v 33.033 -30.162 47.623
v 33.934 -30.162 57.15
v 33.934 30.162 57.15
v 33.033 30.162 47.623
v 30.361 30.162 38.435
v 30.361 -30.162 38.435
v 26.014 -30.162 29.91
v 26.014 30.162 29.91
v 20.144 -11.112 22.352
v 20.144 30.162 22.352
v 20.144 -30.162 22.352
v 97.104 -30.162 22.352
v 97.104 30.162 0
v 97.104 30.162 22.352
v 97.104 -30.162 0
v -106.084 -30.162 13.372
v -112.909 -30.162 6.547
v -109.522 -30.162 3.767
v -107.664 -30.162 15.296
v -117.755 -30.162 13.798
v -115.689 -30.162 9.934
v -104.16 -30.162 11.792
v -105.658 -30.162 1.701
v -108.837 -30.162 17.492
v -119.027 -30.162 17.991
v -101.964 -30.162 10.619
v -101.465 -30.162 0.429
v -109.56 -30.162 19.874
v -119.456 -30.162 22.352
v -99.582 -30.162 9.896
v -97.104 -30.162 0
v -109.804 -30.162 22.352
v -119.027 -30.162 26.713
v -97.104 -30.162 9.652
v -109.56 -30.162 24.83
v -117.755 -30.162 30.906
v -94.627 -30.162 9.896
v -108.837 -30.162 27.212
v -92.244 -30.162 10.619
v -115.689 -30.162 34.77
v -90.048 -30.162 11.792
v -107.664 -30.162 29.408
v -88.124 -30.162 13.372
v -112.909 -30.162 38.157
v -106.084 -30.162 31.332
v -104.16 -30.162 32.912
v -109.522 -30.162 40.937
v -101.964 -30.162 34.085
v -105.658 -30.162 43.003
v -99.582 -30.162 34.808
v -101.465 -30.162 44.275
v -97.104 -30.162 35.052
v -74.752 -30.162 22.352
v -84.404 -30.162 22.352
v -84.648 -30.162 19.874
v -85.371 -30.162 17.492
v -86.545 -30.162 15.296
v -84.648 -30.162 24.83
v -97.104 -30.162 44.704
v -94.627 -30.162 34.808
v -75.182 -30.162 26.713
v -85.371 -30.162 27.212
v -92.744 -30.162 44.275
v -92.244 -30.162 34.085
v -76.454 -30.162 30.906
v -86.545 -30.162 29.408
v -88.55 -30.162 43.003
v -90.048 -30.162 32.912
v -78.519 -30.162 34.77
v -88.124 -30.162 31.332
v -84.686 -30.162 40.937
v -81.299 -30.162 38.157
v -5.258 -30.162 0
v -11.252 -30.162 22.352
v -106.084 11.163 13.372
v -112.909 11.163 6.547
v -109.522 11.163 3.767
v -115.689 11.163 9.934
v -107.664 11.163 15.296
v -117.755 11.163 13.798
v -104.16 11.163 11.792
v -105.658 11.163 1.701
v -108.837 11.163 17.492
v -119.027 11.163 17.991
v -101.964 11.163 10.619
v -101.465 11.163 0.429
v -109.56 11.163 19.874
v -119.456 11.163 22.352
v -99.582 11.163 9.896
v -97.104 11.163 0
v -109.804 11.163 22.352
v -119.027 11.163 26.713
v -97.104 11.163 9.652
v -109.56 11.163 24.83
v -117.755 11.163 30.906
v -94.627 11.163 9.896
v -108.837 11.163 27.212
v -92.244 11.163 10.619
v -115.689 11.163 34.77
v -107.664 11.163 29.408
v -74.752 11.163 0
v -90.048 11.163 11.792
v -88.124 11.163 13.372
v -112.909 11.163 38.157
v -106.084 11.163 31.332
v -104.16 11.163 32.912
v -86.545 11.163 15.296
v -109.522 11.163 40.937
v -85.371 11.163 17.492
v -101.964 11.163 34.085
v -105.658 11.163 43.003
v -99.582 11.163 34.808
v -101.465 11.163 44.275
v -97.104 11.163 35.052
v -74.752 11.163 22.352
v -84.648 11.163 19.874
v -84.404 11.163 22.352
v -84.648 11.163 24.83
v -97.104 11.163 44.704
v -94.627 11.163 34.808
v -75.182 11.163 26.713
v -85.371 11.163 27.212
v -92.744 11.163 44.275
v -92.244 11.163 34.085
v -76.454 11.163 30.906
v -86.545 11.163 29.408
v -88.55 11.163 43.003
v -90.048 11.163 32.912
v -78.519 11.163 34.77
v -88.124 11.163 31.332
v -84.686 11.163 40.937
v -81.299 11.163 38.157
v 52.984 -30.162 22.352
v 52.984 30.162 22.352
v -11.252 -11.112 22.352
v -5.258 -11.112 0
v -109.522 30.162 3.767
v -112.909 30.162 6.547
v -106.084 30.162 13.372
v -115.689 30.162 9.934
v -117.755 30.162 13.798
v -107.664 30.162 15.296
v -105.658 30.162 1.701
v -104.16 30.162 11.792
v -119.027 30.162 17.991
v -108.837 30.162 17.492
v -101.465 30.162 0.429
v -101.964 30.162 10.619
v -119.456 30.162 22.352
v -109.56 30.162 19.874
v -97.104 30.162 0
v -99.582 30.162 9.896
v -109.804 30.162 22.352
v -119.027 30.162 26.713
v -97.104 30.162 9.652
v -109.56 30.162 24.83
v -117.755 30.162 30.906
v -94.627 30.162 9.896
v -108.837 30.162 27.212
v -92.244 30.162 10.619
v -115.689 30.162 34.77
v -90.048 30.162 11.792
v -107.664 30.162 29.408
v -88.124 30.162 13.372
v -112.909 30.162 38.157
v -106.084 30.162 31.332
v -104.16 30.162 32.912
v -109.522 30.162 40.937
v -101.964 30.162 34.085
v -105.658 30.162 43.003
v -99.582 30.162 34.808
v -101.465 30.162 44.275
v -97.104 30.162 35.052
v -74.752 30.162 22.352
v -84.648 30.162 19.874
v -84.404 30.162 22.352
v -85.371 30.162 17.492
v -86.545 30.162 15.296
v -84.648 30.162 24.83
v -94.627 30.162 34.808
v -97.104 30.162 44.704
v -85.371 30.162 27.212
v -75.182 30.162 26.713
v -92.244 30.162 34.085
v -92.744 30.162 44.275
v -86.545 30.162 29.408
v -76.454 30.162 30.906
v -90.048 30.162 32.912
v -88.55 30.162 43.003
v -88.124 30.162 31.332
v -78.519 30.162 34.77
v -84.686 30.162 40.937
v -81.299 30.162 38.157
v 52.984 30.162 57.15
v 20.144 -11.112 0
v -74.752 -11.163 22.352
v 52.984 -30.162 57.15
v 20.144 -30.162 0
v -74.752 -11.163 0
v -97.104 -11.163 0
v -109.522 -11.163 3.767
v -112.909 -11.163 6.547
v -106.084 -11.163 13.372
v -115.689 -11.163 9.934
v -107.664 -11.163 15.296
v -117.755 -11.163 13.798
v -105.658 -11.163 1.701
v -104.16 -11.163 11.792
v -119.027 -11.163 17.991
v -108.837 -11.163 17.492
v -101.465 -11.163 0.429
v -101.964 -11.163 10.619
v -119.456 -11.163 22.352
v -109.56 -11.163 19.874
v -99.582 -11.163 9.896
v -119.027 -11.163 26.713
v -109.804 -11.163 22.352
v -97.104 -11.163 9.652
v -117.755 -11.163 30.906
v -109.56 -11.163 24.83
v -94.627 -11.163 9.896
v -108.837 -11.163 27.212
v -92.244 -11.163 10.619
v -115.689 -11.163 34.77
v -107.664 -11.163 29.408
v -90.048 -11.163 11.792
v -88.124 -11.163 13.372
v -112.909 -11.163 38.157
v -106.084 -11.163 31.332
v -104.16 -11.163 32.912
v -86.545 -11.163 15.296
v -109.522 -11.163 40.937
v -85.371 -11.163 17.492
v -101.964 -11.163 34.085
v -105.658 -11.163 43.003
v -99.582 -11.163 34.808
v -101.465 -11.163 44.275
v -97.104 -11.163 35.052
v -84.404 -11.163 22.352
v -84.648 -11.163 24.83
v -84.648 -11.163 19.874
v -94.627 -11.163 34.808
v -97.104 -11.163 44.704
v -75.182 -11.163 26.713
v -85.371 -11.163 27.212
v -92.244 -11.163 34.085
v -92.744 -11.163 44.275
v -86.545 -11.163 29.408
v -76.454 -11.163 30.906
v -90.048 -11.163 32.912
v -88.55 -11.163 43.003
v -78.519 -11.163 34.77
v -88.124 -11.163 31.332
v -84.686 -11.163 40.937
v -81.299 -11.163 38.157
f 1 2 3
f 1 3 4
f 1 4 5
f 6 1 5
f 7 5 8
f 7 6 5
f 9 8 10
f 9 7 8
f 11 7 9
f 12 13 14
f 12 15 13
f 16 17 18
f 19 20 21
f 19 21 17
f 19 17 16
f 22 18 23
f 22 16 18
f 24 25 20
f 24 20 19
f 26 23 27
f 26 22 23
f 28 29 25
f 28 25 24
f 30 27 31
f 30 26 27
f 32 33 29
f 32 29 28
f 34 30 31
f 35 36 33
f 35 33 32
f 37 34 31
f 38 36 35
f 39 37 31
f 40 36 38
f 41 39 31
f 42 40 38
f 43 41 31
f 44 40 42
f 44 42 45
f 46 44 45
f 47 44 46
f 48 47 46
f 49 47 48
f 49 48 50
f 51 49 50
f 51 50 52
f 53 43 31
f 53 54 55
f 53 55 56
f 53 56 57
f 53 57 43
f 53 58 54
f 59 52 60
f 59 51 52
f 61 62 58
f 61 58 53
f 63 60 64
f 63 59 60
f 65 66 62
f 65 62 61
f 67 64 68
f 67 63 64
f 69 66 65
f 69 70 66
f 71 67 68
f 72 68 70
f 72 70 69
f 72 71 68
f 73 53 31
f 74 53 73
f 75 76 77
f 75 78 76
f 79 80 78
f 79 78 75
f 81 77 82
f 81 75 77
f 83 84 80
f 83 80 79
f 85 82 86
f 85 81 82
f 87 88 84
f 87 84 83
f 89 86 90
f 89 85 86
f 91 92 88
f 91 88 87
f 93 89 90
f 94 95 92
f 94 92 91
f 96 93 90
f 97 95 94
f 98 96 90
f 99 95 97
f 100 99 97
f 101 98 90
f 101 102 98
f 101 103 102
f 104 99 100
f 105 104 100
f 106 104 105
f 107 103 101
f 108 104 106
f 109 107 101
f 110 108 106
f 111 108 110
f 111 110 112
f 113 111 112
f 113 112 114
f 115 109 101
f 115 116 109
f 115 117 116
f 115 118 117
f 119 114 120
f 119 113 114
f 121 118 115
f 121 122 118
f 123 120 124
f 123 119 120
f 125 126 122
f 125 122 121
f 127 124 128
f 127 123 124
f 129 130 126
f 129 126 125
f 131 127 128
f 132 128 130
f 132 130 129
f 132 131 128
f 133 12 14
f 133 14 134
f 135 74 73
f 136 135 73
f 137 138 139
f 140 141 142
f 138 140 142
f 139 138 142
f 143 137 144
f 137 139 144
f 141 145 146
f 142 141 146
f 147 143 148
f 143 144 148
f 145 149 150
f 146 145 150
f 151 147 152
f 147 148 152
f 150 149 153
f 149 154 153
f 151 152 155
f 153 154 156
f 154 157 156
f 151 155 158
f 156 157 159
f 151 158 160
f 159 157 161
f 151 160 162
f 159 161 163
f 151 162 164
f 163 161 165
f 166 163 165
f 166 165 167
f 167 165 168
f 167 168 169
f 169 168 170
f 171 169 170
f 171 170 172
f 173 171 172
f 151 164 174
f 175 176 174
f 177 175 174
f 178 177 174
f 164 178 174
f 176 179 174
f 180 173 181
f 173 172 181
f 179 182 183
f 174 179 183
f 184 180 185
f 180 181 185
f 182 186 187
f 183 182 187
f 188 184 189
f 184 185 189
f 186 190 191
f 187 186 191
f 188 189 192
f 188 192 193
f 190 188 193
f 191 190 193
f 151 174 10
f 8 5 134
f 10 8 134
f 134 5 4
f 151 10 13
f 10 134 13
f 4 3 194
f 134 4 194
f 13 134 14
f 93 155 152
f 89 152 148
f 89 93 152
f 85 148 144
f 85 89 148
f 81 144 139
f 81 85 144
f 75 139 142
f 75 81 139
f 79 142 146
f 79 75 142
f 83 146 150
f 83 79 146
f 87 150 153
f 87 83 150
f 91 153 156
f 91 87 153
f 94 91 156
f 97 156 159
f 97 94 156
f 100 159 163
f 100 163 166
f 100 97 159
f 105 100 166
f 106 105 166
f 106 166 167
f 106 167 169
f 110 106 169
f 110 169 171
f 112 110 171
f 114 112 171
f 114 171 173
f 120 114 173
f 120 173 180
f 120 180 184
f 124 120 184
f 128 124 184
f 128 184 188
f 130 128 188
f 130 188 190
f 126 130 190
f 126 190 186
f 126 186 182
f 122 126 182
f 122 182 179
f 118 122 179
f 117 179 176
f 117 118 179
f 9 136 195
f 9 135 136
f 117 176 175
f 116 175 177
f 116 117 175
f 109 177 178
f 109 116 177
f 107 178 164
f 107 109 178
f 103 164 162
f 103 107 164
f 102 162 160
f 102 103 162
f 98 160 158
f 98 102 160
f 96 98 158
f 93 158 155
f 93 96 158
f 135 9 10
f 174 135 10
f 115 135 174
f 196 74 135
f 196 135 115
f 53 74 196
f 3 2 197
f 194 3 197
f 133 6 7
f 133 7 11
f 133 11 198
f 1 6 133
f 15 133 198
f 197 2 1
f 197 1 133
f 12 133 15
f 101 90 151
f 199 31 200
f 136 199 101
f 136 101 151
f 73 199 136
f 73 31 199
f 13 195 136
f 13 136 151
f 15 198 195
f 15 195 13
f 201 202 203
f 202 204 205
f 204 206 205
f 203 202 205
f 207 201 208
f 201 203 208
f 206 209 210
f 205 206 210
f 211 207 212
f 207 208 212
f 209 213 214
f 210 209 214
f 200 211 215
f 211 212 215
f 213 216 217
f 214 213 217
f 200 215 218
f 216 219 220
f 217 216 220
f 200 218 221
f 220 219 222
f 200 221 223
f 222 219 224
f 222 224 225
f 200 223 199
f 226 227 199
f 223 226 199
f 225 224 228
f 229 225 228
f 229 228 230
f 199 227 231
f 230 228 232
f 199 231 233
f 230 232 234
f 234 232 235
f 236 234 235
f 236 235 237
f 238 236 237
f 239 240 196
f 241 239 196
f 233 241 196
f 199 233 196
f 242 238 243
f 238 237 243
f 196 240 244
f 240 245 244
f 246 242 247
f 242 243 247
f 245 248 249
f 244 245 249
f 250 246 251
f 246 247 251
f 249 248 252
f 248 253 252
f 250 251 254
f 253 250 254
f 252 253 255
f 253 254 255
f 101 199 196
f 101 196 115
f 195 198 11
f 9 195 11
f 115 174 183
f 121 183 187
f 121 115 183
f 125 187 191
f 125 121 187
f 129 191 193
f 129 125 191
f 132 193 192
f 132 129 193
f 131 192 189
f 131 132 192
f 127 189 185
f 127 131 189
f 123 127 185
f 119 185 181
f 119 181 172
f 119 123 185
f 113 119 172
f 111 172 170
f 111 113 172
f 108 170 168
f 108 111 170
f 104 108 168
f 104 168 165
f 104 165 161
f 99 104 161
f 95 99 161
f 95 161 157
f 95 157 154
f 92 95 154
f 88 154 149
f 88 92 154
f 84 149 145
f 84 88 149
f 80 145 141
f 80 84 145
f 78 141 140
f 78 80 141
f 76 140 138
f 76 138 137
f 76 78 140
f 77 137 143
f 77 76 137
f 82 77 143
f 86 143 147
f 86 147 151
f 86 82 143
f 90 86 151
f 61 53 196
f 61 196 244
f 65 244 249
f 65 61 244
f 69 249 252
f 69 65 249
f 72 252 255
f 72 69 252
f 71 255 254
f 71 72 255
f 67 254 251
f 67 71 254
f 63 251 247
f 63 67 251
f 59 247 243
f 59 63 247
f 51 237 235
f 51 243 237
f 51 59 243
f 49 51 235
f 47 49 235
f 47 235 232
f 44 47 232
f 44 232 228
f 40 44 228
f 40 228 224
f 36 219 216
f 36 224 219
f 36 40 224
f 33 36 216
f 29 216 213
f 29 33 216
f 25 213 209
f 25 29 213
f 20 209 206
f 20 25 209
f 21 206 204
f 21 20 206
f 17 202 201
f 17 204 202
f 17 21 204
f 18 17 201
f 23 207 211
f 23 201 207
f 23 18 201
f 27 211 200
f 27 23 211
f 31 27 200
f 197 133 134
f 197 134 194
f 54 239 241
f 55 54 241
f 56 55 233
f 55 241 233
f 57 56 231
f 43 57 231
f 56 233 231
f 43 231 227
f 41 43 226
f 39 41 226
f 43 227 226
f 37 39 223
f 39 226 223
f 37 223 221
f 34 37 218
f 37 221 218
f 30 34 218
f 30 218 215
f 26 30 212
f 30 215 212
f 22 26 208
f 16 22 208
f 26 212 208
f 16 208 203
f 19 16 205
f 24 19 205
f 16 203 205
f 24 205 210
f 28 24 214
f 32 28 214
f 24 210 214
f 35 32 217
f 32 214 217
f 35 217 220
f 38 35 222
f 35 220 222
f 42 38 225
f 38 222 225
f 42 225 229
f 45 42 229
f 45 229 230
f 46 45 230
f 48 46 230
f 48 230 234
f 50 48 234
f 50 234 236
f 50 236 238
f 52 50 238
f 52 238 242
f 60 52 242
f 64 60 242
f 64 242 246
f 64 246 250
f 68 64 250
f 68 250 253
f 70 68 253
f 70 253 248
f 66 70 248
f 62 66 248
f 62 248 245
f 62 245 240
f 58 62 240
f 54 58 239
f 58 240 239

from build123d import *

# Parameters (mm, degrees)
F0_W     = 19.05
F0_H     = 34.798
F1_DEPTH = 30.1625
F3_DEPTH = 19.05
F5_W     = 44.704
F5_H     = 22.3266
F6_DEPTH = 49.531


with BuildPart() as f1:
    # F0 (on Front) → F1 (new body, symmetric)
    with BuildSketch(Plane.XZ):
        Polygon((97.1042, 0), (97.1042, 22.352), (52.9844, 22.352), (33.9344, 22.352), (20.1443877871, 22.352), (20.1443877871, 0), align=None)
        with Locations((43.4594, 39.751)):
            Rectangle(F0_W, F0_H)
        with BuildLine():
            Line((20.1443877871, 22.352), (33.9344, 22.352))
            Line((33.9344, 22.352), (33.9344, 57.15))
            ThreePointArc((33.9344, 57.15), (30.3612323074, 38.4345969798), (20.1443877871, 22.352))
        make_face()
        with BuildLine():
            Line((-97.1042, 0), (20.1443877871, 0))
            Line((20.1443877871, 0), (20.1443877871, 22.352))
            Line((20.1443877871, 22.352), (-74.7522, 22.352))
            ThreePointArc((-74.7522, 22.352), (-81.2989492269, 6.5467492269), (-97.1042, 0))
        make_face()
        with BuildLine():
            ThreePointArc((-74.7522, 22.352), (-112.9094507731, 38.1572507731), (-97.1042, 0))
            Line((-97.1042, 0), (-97.1042, 9.652))
            ThreePointArc((-97.1042, 9.652), (-106.0844561211, 31.3322561211), (-84.4042, 22.352))
            Line((-84.4042, 22.352), (-74.7522, 22.352))
        make_face()
        with BuildLine():
            Line((-97.1042, 9.652), (-97.1042, 0))
            ThreePointArc((-97.1042, 0), (-81.2989492269, 6.5467492269), (-74.7522, 22.352))
            Line((-74.7522, 22.352), (-84.4042, 22.352))
            ThreePointArc((-84.4042, 22.352), (-88.1239438789, 13.3717438789), (-97.1042, 9.652))
        make_face()
    extrude(amount=F1_DEPTH, both=True)

    # F2 (on face) → F3 (cut)
    with BuildSketch(Plane.XZ.offset(30.1625)):
        Polygon((-5.2578, 0), (20.1443877871, 0), (20.1443877871, 22.352), (-11.2522, 22.352), align=None)
    extrude(amount=-F3_DEPTH, mode=Mode.SUBTRACT)

    # F5 (on offset) → F6 (cut, through all)
    with BuildSketch(Plane.XY.offset(49.53)):
        with Locations((-97.1042, 0)):
            Rectangle(F5_W, F5_H)
    extrude(amount=-F6_DEPTH, mode=Mode.SUBTRACT)


solid = f1.part
